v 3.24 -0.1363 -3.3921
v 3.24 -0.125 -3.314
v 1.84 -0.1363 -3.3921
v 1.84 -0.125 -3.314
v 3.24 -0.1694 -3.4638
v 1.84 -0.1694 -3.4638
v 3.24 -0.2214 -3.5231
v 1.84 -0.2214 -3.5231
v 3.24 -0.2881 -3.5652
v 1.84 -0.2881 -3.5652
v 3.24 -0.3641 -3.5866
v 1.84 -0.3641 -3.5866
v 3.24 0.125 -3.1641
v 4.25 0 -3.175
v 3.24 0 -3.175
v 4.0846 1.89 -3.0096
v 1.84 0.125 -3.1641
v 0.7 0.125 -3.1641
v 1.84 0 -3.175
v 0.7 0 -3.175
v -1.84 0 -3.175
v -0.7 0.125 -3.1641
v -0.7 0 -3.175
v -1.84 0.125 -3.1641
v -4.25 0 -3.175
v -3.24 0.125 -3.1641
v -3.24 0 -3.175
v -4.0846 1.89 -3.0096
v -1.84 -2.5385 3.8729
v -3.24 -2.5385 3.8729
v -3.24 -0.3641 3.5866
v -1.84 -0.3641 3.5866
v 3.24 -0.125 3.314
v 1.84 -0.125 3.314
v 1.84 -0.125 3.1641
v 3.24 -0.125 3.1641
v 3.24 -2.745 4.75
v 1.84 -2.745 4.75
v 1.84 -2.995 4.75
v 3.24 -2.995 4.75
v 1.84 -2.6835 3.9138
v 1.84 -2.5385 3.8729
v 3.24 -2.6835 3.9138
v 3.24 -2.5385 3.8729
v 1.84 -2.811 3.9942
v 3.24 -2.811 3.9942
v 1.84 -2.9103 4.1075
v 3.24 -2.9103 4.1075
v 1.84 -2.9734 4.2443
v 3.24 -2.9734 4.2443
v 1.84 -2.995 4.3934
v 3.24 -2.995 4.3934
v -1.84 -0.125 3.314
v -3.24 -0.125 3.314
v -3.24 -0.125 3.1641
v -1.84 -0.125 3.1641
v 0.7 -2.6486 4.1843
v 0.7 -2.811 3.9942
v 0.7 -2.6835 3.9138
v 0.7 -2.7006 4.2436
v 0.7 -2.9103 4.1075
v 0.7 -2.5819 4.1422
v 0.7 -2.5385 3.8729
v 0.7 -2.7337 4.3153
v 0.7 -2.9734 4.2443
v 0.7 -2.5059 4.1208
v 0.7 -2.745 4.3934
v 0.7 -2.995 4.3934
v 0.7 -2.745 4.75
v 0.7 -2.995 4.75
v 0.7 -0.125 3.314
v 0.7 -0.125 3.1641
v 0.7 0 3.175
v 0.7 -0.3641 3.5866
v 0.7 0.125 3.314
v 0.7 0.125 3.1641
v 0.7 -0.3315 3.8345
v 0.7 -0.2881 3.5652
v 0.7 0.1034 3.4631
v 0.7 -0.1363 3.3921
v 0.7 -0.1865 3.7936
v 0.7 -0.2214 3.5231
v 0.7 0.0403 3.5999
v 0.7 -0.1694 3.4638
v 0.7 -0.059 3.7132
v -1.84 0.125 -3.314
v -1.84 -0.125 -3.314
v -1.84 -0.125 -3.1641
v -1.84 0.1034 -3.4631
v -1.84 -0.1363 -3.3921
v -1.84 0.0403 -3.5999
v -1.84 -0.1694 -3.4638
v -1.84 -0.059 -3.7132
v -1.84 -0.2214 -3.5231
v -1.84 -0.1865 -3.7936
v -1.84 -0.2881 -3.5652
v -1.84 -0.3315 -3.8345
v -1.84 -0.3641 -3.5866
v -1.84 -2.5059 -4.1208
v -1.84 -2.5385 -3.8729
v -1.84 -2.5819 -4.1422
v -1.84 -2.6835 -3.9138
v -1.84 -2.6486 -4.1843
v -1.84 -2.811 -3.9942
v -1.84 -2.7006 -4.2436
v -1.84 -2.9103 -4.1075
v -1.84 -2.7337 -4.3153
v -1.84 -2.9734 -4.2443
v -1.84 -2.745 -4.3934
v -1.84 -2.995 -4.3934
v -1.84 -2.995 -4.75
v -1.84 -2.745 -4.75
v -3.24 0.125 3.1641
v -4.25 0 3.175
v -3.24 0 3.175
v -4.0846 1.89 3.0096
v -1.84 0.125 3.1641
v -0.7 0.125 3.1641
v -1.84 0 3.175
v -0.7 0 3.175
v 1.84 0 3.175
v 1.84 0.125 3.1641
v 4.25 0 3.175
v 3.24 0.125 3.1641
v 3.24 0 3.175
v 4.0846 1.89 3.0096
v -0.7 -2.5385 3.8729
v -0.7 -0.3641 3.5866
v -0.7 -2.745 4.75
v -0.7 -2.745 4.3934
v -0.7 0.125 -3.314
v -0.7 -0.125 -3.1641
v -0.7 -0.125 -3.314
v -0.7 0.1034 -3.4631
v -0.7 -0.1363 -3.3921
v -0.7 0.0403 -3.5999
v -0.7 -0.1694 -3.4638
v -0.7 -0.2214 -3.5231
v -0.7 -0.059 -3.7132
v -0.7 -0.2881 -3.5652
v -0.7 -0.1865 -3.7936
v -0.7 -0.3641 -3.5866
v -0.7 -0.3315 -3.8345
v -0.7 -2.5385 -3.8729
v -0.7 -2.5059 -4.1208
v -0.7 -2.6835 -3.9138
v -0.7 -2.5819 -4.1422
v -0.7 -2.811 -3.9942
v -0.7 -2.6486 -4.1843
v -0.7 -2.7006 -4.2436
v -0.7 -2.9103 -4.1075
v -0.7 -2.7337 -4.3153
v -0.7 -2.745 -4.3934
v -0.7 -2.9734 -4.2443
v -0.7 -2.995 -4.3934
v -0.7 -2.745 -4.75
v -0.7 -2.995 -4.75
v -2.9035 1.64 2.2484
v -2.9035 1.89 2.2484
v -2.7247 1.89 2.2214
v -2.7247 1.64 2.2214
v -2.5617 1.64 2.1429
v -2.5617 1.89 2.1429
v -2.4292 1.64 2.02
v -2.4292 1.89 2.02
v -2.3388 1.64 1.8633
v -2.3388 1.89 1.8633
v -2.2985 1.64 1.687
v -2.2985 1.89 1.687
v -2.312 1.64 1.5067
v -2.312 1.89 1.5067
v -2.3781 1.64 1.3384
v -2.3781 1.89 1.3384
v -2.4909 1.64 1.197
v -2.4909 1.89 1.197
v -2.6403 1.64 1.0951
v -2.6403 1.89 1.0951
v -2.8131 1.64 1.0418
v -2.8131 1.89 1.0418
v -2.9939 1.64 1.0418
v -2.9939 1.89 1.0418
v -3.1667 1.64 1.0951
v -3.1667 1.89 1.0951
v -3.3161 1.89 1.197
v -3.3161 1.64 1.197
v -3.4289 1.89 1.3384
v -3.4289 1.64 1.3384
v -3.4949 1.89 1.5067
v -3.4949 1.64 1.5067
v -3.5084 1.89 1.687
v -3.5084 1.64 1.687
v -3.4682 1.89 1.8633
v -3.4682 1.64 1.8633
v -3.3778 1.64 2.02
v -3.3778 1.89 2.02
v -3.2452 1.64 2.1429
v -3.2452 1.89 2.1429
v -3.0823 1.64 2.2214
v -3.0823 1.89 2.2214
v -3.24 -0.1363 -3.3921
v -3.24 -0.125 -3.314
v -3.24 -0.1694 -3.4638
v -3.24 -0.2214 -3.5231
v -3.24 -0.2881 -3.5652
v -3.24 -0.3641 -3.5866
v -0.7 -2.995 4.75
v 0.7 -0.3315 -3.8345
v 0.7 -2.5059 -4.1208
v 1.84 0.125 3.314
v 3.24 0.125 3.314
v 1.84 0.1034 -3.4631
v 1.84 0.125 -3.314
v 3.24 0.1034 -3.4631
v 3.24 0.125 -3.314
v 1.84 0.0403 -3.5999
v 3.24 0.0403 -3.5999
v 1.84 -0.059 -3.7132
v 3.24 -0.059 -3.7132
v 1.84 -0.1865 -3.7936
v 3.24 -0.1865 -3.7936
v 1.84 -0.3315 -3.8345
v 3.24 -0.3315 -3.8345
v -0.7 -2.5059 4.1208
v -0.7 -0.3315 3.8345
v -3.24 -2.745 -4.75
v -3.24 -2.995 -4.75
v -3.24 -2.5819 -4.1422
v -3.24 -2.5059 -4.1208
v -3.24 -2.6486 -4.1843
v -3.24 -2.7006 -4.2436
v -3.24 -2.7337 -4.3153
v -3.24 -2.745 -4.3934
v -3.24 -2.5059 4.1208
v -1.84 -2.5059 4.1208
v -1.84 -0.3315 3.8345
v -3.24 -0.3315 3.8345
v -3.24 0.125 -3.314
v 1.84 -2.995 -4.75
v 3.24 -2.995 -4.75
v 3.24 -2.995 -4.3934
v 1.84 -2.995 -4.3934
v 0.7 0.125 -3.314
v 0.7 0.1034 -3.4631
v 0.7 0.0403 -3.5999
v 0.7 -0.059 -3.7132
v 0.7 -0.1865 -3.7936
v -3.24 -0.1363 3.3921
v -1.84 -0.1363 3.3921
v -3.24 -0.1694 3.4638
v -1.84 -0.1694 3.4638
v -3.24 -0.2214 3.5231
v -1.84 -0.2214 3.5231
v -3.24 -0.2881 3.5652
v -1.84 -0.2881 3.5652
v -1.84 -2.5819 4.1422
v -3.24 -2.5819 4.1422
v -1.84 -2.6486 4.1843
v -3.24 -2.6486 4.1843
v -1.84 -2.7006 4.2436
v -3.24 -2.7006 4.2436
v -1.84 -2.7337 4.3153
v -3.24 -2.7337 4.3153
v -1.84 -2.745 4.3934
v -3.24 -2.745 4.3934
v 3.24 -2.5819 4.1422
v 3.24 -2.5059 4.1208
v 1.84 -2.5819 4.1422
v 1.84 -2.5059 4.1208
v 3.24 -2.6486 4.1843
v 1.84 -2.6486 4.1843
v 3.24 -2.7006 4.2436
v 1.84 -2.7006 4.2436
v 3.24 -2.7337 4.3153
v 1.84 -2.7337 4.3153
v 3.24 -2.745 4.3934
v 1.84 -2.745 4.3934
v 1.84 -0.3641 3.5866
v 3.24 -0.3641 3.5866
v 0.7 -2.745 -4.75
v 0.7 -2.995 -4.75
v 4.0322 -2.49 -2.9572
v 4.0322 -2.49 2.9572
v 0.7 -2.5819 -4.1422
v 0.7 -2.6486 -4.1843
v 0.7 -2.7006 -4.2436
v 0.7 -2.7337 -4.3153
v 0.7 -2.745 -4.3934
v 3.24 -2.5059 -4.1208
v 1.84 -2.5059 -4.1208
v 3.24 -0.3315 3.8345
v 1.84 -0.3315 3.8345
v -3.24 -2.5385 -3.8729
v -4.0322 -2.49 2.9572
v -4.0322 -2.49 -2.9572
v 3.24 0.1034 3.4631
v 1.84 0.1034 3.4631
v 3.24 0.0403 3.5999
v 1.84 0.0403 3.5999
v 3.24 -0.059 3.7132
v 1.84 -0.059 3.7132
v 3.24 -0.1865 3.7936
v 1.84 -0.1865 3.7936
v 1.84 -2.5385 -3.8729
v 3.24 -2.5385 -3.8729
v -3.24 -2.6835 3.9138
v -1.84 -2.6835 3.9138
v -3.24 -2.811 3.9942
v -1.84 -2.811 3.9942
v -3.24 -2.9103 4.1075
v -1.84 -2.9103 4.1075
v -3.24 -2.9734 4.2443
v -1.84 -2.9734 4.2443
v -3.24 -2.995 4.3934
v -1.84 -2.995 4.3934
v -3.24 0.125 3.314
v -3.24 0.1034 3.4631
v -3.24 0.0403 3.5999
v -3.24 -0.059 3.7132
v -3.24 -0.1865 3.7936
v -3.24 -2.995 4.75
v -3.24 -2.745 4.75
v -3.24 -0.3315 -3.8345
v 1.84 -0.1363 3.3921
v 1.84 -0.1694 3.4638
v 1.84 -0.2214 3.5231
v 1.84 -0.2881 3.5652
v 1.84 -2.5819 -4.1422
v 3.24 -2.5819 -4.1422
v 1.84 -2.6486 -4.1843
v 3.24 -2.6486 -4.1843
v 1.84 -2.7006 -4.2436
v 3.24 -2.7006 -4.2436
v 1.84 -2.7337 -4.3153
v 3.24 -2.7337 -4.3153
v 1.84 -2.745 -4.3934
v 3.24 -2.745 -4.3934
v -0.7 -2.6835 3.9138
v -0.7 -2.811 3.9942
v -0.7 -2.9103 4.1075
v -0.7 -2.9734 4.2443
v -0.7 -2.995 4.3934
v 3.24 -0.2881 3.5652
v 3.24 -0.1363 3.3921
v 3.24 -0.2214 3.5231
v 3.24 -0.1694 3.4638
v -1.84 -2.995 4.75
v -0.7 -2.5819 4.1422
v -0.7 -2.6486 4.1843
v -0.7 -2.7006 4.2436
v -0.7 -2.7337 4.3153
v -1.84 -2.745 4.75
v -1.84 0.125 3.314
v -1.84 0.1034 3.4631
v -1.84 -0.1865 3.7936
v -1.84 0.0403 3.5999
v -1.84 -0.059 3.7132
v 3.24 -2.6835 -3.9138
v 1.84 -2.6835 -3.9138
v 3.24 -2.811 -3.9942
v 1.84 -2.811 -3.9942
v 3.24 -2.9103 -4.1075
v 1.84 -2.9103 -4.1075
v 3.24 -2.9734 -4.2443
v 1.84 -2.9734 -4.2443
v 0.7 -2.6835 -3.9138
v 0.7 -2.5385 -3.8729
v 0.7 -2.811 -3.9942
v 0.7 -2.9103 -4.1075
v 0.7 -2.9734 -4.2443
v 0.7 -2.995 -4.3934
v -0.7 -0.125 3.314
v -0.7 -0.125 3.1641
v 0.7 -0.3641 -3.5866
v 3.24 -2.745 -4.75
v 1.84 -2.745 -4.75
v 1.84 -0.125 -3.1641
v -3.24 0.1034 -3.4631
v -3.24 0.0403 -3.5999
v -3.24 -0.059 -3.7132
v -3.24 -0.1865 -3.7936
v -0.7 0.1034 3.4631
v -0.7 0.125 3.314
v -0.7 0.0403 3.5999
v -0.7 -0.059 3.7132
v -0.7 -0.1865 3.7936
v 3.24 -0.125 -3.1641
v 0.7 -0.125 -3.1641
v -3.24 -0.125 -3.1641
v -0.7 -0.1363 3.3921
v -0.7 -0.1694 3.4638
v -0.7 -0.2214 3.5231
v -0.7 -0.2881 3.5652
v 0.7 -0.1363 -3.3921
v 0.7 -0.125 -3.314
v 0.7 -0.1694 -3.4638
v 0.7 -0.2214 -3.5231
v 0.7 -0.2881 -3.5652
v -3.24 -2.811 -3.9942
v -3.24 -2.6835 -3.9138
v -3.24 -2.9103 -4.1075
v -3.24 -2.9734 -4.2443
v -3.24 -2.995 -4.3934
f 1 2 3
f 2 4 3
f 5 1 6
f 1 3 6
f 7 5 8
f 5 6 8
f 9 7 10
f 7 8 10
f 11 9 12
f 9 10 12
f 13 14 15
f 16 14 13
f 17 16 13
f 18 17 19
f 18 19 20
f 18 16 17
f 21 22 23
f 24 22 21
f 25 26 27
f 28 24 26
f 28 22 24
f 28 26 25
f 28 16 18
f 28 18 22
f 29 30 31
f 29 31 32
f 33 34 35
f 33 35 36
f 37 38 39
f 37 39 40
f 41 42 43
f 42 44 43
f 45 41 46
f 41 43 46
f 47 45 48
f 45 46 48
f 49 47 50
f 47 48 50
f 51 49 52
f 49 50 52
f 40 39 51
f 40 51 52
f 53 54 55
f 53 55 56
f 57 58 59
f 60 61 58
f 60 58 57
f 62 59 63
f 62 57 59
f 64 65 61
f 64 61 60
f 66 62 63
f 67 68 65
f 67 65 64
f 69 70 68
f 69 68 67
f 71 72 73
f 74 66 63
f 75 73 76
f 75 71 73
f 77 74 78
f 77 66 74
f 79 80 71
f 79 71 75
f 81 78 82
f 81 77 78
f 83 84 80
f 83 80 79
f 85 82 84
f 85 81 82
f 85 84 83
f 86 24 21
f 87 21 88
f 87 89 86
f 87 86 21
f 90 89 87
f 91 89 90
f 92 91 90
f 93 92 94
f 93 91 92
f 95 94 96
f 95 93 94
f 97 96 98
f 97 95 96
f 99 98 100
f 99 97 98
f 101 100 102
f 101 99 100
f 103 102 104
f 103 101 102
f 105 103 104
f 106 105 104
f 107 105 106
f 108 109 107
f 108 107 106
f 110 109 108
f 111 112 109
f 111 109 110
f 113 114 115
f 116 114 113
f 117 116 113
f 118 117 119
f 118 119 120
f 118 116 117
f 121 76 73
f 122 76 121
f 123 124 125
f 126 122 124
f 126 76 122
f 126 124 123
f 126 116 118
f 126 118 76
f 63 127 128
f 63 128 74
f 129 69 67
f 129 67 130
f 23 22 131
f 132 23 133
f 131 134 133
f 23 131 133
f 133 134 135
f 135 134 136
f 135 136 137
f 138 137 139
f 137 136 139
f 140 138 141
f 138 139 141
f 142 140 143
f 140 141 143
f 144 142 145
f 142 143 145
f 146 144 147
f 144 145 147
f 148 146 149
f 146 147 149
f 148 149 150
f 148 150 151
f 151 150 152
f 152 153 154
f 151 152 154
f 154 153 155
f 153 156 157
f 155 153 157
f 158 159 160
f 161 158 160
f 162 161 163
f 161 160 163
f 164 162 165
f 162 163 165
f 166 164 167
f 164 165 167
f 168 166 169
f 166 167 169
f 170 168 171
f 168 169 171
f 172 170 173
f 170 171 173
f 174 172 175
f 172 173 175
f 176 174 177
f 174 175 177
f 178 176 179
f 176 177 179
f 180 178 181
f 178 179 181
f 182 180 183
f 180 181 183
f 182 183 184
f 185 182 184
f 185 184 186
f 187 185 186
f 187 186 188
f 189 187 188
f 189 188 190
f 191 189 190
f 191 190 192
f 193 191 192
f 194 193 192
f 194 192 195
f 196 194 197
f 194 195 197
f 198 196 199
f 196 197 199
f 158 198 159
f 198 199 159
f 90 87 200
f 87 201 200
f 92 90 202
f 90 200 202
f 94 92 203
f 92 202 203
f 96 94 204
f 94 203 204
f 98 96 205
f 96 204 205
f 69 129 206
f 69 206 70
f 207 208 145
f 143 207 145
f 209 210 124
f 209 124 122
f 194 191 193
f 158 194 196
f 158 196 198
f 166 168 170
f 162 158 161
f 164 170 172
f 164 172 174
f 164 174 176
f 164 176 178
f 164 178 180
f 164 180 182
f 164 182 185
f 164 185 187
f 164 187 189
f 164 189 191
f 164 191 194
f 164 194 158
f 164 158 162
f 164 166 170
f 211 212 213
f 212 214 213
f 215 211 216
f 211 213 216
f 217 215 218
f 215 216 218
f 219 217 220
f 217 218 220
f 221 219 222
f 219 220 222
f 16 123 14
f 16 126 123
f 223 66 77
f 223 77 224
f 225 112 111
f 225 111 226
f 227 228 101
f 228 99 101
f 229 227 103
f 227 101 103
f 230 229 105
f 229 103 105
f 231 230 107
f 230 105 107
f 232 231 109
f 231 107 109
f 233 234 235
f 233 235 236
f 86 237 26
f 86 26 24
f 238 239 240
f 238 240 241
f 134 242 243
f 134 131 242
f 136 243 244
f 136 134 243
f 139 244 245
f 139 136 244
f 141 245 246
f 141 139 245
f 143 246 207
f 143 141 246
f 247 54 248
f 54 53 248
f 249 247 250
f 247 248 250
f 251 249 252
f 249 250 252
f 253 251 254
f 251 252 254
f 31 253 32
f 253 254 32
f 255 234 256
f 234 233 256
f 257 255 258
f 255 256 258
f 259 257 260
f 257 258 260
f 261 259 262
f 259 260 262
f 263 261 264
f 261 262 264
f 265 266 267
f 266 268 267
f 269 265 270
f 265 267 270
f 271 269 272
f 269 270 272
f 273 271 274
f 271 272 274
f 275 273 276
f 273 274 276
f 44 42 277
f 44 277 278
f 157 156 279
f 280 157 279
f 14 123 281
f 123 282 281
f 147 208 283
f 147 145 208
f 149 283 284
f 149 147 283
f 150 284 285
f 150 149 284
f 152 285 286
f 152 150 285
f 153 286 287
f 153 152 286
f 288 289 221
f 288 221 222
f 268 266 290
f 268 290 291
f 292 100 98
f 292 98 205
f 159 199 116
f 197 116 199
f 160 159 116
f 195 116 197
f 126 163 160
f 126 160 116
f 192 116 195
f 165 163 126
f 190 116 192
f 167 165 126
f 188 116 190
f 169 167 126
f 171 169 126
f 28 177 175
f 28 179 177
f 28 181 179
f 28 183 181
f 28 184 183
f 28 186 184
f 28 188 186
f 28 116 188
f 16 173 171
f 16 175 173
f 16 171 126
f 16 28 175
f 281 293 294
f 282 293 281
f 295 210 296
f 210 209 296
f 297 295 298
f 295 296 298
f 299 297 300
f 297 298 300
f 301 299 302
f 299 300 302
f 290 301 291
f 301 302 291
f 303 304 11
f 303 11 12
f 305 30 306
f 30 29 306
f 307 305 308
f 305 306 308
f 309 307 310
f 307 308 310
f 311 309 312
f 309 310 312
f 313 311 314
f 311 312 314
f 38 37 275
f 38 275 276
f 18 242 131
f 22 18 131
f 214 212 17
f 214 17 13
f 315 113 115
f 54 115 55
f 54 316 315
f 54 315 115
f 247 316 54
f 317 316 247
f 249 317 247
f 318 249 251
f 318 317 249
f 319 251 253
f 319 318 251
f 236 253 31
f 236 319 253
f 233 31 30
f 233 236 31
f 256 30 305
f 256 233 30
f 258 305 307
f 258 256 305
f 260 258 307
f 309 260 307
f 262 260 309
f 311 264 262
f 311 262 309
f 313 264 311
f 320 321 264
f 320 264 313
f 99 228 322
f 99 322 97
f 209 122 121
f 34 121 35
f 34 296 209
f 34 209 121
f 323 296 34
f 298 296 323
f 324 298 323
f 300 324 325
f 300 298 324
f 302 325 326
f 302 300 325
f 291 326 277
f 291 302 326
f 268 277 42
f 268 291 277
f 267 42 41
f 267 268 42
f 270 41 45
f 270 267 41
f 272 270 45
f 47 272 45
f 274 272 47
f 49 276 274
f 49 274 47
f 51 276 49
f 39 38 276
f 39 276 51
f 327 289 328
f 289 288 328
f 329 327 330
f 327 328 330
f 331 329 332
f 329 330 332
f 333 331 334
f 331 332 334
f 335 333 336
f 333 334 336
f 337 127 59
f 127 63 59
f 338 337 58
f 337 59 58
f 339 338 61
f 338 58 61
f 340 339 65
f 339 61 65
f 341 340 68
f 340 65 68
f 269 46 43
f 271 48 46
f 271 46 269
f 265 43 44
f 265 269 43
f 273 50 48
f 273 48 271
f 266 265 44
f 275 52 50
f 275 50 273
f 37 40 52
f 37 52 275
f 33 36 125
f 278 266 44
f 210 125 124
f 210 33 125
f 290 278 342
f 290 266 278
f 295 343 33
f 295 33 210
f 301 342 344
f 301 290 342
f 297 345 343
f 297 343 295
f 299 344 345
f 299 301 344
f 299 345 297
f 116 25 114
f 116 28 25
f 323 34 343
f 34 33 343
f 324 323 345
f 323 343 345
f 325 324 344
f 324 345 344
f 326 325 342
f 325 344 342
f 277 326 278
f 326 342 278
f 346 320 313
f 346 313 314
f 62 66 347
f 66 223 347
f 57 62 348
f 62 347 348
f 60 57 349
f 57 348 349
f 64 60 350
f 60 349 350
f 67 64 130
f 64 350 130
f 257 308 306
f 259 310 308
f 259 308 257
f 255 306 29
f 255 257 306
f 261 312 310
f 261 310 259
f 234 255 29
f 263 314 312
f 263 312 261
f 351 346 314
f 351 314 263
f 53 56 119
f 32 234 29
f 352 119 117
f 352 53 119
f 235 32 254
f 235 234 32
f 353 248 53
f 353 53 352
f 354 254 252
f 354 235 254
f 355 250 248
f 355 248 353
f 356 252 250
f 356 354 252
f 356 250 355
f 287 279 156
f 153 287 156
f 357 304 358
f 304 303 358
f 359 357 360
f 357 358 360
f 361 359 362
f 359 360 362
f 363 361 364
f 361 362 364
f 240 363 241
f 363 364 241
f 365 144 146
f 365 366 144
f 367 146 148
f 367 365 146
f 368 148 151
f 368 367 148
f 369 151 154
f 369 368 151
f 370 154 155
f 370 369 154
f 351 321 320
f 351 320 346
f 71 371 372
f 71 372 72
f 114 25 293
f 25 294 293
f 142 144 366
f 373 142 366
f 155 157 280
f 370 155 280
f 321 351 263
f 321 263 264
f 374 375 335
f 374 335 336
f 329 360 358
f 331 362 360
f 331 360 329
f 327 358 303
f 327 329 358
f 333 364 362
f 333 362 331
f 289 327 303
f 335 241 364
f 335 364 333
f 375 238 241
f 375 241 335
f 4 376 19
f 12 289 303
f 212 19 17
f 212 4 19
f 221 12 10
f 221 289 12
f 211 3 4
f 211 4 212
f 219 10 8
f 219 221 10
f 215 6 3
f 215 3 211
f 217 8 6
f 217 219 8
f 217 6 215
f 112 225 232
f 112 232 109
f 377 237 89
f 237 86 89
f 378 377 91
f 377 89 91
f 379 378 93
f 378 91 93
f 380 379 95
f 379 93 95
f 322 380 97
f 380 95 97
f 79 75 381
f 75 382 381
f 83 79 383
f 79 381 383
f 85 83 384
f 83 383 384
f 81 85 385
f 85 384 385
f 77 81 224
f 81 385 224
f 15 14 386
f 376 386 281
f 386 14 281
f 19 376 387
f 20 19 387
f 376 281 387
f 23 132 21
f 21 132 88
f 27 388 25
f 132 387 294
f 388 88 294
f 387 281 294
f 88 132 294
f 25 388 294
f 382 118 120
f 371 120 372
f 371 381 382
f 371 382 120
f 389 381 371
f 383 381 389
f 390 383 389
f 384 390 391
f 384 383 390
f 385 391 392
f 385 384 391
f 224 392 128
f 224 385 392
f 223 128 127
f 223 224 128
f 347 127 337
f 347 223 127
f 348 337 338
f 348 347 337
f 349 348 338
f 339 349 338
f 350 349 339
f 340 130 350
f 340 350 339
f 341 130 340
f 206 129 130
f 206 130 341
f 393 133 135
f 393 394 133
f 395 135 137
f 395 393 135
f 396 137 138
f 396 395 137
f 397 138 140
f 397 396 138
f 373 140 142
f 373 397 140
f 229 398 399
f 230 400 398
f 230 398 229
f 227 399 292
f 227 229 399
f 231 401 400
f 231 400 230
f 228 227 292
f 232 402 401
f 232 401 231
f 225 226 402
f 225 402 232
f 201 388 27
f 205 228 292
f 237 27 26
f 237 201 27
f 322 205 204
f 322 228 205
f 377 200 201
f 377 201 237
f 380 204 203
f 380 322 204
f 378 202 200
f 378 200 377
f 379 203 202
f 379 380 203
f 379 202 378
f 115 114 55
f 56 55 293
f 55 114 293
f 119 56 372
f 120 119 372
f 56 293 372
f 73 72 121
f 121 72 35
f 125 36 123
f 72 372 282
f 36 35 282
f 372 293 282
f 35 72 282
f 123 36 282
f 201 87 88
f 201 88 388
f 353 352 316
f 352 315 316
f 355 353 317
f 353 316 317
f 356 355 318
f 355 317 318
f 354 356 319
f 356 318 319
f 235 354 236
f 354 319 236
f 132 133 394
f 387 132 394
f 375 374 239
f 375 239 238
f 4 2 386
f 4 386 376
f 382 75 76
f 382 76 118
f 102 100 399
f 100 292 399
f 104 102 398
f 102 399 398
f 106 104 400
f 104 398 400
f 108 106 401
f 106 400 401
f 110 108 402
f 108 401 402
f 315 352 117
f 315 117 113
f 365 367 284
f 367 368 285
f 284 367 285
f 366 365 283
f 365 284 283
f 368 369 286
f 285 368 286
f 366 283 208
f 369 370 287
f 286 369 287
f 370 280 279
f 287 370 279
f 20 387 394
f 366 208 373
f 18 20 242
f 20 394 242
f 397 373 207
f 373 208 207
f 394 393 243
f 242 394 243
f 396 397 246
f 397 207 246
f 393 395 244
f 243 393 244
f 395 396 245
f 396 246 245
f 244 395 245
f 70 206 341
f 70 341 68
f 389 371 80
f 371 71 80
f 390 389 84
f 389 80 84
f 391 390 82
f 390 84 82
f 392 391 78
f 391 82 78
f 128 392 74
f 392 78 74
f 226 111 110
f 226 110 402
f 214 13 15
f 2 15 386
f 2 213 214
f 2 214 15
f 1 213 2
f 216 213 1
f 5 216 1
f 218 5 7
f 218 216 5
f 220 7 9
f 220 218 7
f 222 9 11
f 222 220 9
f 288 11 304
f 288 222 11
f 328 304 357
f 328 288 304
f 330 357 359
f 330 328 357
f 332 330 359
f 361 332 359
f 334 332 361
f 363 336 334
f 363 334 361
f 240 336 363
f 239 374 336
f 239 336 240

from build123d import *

# Parameters (mm, degrees)
SKETCH1_W                     = 8.5
SKETCH1_H                     = 6.35
BOSS_EXTRUDE1_DEPTH           = 1.89
BOSS_EXTRUDE1_TAPER           = 5
BOSS_EXTRUDE1_OTHER_WAY_DEPTH = 2.49
BOSS_EXTRUDE1_OTHER_WAY_TAPER = 5
SKETCH2_W                     = 1.4
SKETCH2_H                     = 0.25
LPATTERN1_COUNT               = 2
LPATTERN1_PITCH               = 2.54
LPATTERN1_COL_COUNT           = 2
LPATTERN1_COL_PITCH           = 2.54
MIRROR1_COPY_1_SKETCH_W       = 1.4
MIRROR1_COPY_1_SKETCH_H       = 0.25
MIRROR1_COPY_2_SKETCH_W       = 1.4
MIRROR1_COPY_2_SKETCH_H       = 0.25
SKETCH4_R                     = 0.606643951
CUT_EXTRUDE1_DEPTH            = 0.25


with BuildPart() as part:
    # Sketch1 → Boss-Extrude1 (new body)
    with BuildSketch(Plane(origin=(0, 0, 0), x_dir=(1, 0, 0), z_dir=(0, 1, 0))):
        Rectangle(SKETCH1_W, SKETCH1_H)
    extrude(amount=BOSS_EXTRUDE1_DEPTH, taper=BOSS_EXTRUDE1_TAPER)

    # Sketch1 → Boss-Extrude1 other way (add)
    with BuildSketch(Plane(origin=(0, 0, 0), x_dir=(1, 0, 0), z_dir=(0, 1, 0))):
        Rectangle(SKETCH1_W, SKETCH1_H)
    extrude(amount=-BOSS_EXTRUDE1_OTHER_WAY_DEPTH, taper=BOSS_EXTRUDE1_OTHER_WAY_TAPER)

    # Sweep1: sweep along a path in Sketch3
    with BuildLine(Plane(origin=(0, 0, 0), x_dir=(0, 0, -1), z_dir=(1, 0, 0))) as sweep1_path:
        Line((0, 0), (-3.3139807, 0))
        ThreePointArc((-3.3139807, 0), (-3.577719026, -0.099264077), (-3.710558645, -0.347789523))
        Line((-3.710558645, -0.347789523), (-3.996826594, -2.522210477))
        ThreePointArc((-3.996826594, -2.522210477), (-4.129666213, -2.770735923), (-4.393404539, -2.87))
        Line((-4.393404539, -2.87), (-4.75, -2.87))
    # Sketch2 → Sweep1 (sweep)
    with BuildSketch(Plane.XY):
        Rectangle(SKETCH2_W, SKETCH2_H)
    sweep1 = sweep(path=sweep1_path.line)

    # LPattern1: Sweep1 ×2
    with Locations(*[(i * LPATTERN1_PITCH, 0, 0) for i in range(1, LPATTERN1_COUNT)]):
        add(sweep1)

    # LPattern1 col: Sweep1 ×2
    with Locations(*[(-i * LPATTERN1_COL_PITCH, 0, 0) for i in range(1, LPATTERN1_COL_COUNT)]):
        add(sweep1)

    # Mirror1: Sweep1 across plane
    add(sweep1.mirror(Plane.XY))

    # Mirror1 copy 1: sweep along a path in Mirror1 copy 1 path
    with BuildLine(Plane(origin=(2.54, 0, 0), x_dir=(0, 0, 1), z_dir=(1, 0, 0))) as mirror1_copy_1_path:
        Line((0, 0), (-3.3139807, 0))
        ThreePointArc((-3.3139807, 0), (-3.577719026, 0.099264077), (-3.710558645, 0.347789523))
        Line((-3.710558645, 0.347789523), (-3.996826594, 2.522210477))
        ThreePointArc((-3.996826594, 2.522210477), (-4.129666213, 2.770735923), (-4.393404539, 2.87))
        Line((-4.393404539, 2.87), (-4.75, 2.87))
    # Mirror1 copy 1 sketch → Mirror1 copy 1 (sweep)
    with BuildSketch(Plane(origin=(2.54, 0, 0), x_dir=(1, 0, 0), z_dir=(0, 0, -1))):
        Rectangle(MIRROR1_COPY_1_SKETCH_W, MIRROR1_COPY_1_SKETCH_H)
    sweep(path=mirror1_copy_1_path.line)

    # Mirror1 copy 2: sweep along a path in Mirror1 copy 2 path
    with BuildLine(Plane(origin=(-2.54, 0, 0), x_dir=(0, 0, 1), z_dir=(1, 0, 0))) as mirror1_copy_2_path:
        Line((0, 0), (-3.3139807, 0))
        ThreePointArc((-3.3139807, 0), (-3.577719026, 0.099264077), (-3.710558645, 0.347789523))
        Line((-3.710558645, 0.347789523), (-3.996826594, 2.522210477))
        ThreePointArc((-3.996826594, 2.522210477), (-4.129666213, 2.770735923), (-4.393404539, 2.87))
        Line((-4.393404539, 2.87), (-4.75, 2.87))
    # Mirror1 copy 2 sketch → Mirror1 copy 2 (sweep)
    with BuildSketch(Plane(origin=(-2.54, 0, 0), x_dir=(1, 0, 0), z_dir=(0, 0, -1))):
        Rectangle(MIRROR1_COPY_2_SKETCH_W, MIRROR1_COPY_2_SKETCH_H)
    sweep(path=mirror1_copy_2_path.line)

    # Sketch4 → Cut-Extrude1 (cut)
    with BuildSketch(Plane(origin=(0, 1.89, 0), x_dir=(1, 0, 0), z_dir=(0, 1, 0))):
        with Locations(Location((-2.903482354, -1.641715186, 0), (0, 0, 270))):
            Circle(SKETCH4_R)
    extrude(amount=-CUT_EXTRUDE1_DEPTH, mode=Mode.SUBTRACT)


solid = part.part
